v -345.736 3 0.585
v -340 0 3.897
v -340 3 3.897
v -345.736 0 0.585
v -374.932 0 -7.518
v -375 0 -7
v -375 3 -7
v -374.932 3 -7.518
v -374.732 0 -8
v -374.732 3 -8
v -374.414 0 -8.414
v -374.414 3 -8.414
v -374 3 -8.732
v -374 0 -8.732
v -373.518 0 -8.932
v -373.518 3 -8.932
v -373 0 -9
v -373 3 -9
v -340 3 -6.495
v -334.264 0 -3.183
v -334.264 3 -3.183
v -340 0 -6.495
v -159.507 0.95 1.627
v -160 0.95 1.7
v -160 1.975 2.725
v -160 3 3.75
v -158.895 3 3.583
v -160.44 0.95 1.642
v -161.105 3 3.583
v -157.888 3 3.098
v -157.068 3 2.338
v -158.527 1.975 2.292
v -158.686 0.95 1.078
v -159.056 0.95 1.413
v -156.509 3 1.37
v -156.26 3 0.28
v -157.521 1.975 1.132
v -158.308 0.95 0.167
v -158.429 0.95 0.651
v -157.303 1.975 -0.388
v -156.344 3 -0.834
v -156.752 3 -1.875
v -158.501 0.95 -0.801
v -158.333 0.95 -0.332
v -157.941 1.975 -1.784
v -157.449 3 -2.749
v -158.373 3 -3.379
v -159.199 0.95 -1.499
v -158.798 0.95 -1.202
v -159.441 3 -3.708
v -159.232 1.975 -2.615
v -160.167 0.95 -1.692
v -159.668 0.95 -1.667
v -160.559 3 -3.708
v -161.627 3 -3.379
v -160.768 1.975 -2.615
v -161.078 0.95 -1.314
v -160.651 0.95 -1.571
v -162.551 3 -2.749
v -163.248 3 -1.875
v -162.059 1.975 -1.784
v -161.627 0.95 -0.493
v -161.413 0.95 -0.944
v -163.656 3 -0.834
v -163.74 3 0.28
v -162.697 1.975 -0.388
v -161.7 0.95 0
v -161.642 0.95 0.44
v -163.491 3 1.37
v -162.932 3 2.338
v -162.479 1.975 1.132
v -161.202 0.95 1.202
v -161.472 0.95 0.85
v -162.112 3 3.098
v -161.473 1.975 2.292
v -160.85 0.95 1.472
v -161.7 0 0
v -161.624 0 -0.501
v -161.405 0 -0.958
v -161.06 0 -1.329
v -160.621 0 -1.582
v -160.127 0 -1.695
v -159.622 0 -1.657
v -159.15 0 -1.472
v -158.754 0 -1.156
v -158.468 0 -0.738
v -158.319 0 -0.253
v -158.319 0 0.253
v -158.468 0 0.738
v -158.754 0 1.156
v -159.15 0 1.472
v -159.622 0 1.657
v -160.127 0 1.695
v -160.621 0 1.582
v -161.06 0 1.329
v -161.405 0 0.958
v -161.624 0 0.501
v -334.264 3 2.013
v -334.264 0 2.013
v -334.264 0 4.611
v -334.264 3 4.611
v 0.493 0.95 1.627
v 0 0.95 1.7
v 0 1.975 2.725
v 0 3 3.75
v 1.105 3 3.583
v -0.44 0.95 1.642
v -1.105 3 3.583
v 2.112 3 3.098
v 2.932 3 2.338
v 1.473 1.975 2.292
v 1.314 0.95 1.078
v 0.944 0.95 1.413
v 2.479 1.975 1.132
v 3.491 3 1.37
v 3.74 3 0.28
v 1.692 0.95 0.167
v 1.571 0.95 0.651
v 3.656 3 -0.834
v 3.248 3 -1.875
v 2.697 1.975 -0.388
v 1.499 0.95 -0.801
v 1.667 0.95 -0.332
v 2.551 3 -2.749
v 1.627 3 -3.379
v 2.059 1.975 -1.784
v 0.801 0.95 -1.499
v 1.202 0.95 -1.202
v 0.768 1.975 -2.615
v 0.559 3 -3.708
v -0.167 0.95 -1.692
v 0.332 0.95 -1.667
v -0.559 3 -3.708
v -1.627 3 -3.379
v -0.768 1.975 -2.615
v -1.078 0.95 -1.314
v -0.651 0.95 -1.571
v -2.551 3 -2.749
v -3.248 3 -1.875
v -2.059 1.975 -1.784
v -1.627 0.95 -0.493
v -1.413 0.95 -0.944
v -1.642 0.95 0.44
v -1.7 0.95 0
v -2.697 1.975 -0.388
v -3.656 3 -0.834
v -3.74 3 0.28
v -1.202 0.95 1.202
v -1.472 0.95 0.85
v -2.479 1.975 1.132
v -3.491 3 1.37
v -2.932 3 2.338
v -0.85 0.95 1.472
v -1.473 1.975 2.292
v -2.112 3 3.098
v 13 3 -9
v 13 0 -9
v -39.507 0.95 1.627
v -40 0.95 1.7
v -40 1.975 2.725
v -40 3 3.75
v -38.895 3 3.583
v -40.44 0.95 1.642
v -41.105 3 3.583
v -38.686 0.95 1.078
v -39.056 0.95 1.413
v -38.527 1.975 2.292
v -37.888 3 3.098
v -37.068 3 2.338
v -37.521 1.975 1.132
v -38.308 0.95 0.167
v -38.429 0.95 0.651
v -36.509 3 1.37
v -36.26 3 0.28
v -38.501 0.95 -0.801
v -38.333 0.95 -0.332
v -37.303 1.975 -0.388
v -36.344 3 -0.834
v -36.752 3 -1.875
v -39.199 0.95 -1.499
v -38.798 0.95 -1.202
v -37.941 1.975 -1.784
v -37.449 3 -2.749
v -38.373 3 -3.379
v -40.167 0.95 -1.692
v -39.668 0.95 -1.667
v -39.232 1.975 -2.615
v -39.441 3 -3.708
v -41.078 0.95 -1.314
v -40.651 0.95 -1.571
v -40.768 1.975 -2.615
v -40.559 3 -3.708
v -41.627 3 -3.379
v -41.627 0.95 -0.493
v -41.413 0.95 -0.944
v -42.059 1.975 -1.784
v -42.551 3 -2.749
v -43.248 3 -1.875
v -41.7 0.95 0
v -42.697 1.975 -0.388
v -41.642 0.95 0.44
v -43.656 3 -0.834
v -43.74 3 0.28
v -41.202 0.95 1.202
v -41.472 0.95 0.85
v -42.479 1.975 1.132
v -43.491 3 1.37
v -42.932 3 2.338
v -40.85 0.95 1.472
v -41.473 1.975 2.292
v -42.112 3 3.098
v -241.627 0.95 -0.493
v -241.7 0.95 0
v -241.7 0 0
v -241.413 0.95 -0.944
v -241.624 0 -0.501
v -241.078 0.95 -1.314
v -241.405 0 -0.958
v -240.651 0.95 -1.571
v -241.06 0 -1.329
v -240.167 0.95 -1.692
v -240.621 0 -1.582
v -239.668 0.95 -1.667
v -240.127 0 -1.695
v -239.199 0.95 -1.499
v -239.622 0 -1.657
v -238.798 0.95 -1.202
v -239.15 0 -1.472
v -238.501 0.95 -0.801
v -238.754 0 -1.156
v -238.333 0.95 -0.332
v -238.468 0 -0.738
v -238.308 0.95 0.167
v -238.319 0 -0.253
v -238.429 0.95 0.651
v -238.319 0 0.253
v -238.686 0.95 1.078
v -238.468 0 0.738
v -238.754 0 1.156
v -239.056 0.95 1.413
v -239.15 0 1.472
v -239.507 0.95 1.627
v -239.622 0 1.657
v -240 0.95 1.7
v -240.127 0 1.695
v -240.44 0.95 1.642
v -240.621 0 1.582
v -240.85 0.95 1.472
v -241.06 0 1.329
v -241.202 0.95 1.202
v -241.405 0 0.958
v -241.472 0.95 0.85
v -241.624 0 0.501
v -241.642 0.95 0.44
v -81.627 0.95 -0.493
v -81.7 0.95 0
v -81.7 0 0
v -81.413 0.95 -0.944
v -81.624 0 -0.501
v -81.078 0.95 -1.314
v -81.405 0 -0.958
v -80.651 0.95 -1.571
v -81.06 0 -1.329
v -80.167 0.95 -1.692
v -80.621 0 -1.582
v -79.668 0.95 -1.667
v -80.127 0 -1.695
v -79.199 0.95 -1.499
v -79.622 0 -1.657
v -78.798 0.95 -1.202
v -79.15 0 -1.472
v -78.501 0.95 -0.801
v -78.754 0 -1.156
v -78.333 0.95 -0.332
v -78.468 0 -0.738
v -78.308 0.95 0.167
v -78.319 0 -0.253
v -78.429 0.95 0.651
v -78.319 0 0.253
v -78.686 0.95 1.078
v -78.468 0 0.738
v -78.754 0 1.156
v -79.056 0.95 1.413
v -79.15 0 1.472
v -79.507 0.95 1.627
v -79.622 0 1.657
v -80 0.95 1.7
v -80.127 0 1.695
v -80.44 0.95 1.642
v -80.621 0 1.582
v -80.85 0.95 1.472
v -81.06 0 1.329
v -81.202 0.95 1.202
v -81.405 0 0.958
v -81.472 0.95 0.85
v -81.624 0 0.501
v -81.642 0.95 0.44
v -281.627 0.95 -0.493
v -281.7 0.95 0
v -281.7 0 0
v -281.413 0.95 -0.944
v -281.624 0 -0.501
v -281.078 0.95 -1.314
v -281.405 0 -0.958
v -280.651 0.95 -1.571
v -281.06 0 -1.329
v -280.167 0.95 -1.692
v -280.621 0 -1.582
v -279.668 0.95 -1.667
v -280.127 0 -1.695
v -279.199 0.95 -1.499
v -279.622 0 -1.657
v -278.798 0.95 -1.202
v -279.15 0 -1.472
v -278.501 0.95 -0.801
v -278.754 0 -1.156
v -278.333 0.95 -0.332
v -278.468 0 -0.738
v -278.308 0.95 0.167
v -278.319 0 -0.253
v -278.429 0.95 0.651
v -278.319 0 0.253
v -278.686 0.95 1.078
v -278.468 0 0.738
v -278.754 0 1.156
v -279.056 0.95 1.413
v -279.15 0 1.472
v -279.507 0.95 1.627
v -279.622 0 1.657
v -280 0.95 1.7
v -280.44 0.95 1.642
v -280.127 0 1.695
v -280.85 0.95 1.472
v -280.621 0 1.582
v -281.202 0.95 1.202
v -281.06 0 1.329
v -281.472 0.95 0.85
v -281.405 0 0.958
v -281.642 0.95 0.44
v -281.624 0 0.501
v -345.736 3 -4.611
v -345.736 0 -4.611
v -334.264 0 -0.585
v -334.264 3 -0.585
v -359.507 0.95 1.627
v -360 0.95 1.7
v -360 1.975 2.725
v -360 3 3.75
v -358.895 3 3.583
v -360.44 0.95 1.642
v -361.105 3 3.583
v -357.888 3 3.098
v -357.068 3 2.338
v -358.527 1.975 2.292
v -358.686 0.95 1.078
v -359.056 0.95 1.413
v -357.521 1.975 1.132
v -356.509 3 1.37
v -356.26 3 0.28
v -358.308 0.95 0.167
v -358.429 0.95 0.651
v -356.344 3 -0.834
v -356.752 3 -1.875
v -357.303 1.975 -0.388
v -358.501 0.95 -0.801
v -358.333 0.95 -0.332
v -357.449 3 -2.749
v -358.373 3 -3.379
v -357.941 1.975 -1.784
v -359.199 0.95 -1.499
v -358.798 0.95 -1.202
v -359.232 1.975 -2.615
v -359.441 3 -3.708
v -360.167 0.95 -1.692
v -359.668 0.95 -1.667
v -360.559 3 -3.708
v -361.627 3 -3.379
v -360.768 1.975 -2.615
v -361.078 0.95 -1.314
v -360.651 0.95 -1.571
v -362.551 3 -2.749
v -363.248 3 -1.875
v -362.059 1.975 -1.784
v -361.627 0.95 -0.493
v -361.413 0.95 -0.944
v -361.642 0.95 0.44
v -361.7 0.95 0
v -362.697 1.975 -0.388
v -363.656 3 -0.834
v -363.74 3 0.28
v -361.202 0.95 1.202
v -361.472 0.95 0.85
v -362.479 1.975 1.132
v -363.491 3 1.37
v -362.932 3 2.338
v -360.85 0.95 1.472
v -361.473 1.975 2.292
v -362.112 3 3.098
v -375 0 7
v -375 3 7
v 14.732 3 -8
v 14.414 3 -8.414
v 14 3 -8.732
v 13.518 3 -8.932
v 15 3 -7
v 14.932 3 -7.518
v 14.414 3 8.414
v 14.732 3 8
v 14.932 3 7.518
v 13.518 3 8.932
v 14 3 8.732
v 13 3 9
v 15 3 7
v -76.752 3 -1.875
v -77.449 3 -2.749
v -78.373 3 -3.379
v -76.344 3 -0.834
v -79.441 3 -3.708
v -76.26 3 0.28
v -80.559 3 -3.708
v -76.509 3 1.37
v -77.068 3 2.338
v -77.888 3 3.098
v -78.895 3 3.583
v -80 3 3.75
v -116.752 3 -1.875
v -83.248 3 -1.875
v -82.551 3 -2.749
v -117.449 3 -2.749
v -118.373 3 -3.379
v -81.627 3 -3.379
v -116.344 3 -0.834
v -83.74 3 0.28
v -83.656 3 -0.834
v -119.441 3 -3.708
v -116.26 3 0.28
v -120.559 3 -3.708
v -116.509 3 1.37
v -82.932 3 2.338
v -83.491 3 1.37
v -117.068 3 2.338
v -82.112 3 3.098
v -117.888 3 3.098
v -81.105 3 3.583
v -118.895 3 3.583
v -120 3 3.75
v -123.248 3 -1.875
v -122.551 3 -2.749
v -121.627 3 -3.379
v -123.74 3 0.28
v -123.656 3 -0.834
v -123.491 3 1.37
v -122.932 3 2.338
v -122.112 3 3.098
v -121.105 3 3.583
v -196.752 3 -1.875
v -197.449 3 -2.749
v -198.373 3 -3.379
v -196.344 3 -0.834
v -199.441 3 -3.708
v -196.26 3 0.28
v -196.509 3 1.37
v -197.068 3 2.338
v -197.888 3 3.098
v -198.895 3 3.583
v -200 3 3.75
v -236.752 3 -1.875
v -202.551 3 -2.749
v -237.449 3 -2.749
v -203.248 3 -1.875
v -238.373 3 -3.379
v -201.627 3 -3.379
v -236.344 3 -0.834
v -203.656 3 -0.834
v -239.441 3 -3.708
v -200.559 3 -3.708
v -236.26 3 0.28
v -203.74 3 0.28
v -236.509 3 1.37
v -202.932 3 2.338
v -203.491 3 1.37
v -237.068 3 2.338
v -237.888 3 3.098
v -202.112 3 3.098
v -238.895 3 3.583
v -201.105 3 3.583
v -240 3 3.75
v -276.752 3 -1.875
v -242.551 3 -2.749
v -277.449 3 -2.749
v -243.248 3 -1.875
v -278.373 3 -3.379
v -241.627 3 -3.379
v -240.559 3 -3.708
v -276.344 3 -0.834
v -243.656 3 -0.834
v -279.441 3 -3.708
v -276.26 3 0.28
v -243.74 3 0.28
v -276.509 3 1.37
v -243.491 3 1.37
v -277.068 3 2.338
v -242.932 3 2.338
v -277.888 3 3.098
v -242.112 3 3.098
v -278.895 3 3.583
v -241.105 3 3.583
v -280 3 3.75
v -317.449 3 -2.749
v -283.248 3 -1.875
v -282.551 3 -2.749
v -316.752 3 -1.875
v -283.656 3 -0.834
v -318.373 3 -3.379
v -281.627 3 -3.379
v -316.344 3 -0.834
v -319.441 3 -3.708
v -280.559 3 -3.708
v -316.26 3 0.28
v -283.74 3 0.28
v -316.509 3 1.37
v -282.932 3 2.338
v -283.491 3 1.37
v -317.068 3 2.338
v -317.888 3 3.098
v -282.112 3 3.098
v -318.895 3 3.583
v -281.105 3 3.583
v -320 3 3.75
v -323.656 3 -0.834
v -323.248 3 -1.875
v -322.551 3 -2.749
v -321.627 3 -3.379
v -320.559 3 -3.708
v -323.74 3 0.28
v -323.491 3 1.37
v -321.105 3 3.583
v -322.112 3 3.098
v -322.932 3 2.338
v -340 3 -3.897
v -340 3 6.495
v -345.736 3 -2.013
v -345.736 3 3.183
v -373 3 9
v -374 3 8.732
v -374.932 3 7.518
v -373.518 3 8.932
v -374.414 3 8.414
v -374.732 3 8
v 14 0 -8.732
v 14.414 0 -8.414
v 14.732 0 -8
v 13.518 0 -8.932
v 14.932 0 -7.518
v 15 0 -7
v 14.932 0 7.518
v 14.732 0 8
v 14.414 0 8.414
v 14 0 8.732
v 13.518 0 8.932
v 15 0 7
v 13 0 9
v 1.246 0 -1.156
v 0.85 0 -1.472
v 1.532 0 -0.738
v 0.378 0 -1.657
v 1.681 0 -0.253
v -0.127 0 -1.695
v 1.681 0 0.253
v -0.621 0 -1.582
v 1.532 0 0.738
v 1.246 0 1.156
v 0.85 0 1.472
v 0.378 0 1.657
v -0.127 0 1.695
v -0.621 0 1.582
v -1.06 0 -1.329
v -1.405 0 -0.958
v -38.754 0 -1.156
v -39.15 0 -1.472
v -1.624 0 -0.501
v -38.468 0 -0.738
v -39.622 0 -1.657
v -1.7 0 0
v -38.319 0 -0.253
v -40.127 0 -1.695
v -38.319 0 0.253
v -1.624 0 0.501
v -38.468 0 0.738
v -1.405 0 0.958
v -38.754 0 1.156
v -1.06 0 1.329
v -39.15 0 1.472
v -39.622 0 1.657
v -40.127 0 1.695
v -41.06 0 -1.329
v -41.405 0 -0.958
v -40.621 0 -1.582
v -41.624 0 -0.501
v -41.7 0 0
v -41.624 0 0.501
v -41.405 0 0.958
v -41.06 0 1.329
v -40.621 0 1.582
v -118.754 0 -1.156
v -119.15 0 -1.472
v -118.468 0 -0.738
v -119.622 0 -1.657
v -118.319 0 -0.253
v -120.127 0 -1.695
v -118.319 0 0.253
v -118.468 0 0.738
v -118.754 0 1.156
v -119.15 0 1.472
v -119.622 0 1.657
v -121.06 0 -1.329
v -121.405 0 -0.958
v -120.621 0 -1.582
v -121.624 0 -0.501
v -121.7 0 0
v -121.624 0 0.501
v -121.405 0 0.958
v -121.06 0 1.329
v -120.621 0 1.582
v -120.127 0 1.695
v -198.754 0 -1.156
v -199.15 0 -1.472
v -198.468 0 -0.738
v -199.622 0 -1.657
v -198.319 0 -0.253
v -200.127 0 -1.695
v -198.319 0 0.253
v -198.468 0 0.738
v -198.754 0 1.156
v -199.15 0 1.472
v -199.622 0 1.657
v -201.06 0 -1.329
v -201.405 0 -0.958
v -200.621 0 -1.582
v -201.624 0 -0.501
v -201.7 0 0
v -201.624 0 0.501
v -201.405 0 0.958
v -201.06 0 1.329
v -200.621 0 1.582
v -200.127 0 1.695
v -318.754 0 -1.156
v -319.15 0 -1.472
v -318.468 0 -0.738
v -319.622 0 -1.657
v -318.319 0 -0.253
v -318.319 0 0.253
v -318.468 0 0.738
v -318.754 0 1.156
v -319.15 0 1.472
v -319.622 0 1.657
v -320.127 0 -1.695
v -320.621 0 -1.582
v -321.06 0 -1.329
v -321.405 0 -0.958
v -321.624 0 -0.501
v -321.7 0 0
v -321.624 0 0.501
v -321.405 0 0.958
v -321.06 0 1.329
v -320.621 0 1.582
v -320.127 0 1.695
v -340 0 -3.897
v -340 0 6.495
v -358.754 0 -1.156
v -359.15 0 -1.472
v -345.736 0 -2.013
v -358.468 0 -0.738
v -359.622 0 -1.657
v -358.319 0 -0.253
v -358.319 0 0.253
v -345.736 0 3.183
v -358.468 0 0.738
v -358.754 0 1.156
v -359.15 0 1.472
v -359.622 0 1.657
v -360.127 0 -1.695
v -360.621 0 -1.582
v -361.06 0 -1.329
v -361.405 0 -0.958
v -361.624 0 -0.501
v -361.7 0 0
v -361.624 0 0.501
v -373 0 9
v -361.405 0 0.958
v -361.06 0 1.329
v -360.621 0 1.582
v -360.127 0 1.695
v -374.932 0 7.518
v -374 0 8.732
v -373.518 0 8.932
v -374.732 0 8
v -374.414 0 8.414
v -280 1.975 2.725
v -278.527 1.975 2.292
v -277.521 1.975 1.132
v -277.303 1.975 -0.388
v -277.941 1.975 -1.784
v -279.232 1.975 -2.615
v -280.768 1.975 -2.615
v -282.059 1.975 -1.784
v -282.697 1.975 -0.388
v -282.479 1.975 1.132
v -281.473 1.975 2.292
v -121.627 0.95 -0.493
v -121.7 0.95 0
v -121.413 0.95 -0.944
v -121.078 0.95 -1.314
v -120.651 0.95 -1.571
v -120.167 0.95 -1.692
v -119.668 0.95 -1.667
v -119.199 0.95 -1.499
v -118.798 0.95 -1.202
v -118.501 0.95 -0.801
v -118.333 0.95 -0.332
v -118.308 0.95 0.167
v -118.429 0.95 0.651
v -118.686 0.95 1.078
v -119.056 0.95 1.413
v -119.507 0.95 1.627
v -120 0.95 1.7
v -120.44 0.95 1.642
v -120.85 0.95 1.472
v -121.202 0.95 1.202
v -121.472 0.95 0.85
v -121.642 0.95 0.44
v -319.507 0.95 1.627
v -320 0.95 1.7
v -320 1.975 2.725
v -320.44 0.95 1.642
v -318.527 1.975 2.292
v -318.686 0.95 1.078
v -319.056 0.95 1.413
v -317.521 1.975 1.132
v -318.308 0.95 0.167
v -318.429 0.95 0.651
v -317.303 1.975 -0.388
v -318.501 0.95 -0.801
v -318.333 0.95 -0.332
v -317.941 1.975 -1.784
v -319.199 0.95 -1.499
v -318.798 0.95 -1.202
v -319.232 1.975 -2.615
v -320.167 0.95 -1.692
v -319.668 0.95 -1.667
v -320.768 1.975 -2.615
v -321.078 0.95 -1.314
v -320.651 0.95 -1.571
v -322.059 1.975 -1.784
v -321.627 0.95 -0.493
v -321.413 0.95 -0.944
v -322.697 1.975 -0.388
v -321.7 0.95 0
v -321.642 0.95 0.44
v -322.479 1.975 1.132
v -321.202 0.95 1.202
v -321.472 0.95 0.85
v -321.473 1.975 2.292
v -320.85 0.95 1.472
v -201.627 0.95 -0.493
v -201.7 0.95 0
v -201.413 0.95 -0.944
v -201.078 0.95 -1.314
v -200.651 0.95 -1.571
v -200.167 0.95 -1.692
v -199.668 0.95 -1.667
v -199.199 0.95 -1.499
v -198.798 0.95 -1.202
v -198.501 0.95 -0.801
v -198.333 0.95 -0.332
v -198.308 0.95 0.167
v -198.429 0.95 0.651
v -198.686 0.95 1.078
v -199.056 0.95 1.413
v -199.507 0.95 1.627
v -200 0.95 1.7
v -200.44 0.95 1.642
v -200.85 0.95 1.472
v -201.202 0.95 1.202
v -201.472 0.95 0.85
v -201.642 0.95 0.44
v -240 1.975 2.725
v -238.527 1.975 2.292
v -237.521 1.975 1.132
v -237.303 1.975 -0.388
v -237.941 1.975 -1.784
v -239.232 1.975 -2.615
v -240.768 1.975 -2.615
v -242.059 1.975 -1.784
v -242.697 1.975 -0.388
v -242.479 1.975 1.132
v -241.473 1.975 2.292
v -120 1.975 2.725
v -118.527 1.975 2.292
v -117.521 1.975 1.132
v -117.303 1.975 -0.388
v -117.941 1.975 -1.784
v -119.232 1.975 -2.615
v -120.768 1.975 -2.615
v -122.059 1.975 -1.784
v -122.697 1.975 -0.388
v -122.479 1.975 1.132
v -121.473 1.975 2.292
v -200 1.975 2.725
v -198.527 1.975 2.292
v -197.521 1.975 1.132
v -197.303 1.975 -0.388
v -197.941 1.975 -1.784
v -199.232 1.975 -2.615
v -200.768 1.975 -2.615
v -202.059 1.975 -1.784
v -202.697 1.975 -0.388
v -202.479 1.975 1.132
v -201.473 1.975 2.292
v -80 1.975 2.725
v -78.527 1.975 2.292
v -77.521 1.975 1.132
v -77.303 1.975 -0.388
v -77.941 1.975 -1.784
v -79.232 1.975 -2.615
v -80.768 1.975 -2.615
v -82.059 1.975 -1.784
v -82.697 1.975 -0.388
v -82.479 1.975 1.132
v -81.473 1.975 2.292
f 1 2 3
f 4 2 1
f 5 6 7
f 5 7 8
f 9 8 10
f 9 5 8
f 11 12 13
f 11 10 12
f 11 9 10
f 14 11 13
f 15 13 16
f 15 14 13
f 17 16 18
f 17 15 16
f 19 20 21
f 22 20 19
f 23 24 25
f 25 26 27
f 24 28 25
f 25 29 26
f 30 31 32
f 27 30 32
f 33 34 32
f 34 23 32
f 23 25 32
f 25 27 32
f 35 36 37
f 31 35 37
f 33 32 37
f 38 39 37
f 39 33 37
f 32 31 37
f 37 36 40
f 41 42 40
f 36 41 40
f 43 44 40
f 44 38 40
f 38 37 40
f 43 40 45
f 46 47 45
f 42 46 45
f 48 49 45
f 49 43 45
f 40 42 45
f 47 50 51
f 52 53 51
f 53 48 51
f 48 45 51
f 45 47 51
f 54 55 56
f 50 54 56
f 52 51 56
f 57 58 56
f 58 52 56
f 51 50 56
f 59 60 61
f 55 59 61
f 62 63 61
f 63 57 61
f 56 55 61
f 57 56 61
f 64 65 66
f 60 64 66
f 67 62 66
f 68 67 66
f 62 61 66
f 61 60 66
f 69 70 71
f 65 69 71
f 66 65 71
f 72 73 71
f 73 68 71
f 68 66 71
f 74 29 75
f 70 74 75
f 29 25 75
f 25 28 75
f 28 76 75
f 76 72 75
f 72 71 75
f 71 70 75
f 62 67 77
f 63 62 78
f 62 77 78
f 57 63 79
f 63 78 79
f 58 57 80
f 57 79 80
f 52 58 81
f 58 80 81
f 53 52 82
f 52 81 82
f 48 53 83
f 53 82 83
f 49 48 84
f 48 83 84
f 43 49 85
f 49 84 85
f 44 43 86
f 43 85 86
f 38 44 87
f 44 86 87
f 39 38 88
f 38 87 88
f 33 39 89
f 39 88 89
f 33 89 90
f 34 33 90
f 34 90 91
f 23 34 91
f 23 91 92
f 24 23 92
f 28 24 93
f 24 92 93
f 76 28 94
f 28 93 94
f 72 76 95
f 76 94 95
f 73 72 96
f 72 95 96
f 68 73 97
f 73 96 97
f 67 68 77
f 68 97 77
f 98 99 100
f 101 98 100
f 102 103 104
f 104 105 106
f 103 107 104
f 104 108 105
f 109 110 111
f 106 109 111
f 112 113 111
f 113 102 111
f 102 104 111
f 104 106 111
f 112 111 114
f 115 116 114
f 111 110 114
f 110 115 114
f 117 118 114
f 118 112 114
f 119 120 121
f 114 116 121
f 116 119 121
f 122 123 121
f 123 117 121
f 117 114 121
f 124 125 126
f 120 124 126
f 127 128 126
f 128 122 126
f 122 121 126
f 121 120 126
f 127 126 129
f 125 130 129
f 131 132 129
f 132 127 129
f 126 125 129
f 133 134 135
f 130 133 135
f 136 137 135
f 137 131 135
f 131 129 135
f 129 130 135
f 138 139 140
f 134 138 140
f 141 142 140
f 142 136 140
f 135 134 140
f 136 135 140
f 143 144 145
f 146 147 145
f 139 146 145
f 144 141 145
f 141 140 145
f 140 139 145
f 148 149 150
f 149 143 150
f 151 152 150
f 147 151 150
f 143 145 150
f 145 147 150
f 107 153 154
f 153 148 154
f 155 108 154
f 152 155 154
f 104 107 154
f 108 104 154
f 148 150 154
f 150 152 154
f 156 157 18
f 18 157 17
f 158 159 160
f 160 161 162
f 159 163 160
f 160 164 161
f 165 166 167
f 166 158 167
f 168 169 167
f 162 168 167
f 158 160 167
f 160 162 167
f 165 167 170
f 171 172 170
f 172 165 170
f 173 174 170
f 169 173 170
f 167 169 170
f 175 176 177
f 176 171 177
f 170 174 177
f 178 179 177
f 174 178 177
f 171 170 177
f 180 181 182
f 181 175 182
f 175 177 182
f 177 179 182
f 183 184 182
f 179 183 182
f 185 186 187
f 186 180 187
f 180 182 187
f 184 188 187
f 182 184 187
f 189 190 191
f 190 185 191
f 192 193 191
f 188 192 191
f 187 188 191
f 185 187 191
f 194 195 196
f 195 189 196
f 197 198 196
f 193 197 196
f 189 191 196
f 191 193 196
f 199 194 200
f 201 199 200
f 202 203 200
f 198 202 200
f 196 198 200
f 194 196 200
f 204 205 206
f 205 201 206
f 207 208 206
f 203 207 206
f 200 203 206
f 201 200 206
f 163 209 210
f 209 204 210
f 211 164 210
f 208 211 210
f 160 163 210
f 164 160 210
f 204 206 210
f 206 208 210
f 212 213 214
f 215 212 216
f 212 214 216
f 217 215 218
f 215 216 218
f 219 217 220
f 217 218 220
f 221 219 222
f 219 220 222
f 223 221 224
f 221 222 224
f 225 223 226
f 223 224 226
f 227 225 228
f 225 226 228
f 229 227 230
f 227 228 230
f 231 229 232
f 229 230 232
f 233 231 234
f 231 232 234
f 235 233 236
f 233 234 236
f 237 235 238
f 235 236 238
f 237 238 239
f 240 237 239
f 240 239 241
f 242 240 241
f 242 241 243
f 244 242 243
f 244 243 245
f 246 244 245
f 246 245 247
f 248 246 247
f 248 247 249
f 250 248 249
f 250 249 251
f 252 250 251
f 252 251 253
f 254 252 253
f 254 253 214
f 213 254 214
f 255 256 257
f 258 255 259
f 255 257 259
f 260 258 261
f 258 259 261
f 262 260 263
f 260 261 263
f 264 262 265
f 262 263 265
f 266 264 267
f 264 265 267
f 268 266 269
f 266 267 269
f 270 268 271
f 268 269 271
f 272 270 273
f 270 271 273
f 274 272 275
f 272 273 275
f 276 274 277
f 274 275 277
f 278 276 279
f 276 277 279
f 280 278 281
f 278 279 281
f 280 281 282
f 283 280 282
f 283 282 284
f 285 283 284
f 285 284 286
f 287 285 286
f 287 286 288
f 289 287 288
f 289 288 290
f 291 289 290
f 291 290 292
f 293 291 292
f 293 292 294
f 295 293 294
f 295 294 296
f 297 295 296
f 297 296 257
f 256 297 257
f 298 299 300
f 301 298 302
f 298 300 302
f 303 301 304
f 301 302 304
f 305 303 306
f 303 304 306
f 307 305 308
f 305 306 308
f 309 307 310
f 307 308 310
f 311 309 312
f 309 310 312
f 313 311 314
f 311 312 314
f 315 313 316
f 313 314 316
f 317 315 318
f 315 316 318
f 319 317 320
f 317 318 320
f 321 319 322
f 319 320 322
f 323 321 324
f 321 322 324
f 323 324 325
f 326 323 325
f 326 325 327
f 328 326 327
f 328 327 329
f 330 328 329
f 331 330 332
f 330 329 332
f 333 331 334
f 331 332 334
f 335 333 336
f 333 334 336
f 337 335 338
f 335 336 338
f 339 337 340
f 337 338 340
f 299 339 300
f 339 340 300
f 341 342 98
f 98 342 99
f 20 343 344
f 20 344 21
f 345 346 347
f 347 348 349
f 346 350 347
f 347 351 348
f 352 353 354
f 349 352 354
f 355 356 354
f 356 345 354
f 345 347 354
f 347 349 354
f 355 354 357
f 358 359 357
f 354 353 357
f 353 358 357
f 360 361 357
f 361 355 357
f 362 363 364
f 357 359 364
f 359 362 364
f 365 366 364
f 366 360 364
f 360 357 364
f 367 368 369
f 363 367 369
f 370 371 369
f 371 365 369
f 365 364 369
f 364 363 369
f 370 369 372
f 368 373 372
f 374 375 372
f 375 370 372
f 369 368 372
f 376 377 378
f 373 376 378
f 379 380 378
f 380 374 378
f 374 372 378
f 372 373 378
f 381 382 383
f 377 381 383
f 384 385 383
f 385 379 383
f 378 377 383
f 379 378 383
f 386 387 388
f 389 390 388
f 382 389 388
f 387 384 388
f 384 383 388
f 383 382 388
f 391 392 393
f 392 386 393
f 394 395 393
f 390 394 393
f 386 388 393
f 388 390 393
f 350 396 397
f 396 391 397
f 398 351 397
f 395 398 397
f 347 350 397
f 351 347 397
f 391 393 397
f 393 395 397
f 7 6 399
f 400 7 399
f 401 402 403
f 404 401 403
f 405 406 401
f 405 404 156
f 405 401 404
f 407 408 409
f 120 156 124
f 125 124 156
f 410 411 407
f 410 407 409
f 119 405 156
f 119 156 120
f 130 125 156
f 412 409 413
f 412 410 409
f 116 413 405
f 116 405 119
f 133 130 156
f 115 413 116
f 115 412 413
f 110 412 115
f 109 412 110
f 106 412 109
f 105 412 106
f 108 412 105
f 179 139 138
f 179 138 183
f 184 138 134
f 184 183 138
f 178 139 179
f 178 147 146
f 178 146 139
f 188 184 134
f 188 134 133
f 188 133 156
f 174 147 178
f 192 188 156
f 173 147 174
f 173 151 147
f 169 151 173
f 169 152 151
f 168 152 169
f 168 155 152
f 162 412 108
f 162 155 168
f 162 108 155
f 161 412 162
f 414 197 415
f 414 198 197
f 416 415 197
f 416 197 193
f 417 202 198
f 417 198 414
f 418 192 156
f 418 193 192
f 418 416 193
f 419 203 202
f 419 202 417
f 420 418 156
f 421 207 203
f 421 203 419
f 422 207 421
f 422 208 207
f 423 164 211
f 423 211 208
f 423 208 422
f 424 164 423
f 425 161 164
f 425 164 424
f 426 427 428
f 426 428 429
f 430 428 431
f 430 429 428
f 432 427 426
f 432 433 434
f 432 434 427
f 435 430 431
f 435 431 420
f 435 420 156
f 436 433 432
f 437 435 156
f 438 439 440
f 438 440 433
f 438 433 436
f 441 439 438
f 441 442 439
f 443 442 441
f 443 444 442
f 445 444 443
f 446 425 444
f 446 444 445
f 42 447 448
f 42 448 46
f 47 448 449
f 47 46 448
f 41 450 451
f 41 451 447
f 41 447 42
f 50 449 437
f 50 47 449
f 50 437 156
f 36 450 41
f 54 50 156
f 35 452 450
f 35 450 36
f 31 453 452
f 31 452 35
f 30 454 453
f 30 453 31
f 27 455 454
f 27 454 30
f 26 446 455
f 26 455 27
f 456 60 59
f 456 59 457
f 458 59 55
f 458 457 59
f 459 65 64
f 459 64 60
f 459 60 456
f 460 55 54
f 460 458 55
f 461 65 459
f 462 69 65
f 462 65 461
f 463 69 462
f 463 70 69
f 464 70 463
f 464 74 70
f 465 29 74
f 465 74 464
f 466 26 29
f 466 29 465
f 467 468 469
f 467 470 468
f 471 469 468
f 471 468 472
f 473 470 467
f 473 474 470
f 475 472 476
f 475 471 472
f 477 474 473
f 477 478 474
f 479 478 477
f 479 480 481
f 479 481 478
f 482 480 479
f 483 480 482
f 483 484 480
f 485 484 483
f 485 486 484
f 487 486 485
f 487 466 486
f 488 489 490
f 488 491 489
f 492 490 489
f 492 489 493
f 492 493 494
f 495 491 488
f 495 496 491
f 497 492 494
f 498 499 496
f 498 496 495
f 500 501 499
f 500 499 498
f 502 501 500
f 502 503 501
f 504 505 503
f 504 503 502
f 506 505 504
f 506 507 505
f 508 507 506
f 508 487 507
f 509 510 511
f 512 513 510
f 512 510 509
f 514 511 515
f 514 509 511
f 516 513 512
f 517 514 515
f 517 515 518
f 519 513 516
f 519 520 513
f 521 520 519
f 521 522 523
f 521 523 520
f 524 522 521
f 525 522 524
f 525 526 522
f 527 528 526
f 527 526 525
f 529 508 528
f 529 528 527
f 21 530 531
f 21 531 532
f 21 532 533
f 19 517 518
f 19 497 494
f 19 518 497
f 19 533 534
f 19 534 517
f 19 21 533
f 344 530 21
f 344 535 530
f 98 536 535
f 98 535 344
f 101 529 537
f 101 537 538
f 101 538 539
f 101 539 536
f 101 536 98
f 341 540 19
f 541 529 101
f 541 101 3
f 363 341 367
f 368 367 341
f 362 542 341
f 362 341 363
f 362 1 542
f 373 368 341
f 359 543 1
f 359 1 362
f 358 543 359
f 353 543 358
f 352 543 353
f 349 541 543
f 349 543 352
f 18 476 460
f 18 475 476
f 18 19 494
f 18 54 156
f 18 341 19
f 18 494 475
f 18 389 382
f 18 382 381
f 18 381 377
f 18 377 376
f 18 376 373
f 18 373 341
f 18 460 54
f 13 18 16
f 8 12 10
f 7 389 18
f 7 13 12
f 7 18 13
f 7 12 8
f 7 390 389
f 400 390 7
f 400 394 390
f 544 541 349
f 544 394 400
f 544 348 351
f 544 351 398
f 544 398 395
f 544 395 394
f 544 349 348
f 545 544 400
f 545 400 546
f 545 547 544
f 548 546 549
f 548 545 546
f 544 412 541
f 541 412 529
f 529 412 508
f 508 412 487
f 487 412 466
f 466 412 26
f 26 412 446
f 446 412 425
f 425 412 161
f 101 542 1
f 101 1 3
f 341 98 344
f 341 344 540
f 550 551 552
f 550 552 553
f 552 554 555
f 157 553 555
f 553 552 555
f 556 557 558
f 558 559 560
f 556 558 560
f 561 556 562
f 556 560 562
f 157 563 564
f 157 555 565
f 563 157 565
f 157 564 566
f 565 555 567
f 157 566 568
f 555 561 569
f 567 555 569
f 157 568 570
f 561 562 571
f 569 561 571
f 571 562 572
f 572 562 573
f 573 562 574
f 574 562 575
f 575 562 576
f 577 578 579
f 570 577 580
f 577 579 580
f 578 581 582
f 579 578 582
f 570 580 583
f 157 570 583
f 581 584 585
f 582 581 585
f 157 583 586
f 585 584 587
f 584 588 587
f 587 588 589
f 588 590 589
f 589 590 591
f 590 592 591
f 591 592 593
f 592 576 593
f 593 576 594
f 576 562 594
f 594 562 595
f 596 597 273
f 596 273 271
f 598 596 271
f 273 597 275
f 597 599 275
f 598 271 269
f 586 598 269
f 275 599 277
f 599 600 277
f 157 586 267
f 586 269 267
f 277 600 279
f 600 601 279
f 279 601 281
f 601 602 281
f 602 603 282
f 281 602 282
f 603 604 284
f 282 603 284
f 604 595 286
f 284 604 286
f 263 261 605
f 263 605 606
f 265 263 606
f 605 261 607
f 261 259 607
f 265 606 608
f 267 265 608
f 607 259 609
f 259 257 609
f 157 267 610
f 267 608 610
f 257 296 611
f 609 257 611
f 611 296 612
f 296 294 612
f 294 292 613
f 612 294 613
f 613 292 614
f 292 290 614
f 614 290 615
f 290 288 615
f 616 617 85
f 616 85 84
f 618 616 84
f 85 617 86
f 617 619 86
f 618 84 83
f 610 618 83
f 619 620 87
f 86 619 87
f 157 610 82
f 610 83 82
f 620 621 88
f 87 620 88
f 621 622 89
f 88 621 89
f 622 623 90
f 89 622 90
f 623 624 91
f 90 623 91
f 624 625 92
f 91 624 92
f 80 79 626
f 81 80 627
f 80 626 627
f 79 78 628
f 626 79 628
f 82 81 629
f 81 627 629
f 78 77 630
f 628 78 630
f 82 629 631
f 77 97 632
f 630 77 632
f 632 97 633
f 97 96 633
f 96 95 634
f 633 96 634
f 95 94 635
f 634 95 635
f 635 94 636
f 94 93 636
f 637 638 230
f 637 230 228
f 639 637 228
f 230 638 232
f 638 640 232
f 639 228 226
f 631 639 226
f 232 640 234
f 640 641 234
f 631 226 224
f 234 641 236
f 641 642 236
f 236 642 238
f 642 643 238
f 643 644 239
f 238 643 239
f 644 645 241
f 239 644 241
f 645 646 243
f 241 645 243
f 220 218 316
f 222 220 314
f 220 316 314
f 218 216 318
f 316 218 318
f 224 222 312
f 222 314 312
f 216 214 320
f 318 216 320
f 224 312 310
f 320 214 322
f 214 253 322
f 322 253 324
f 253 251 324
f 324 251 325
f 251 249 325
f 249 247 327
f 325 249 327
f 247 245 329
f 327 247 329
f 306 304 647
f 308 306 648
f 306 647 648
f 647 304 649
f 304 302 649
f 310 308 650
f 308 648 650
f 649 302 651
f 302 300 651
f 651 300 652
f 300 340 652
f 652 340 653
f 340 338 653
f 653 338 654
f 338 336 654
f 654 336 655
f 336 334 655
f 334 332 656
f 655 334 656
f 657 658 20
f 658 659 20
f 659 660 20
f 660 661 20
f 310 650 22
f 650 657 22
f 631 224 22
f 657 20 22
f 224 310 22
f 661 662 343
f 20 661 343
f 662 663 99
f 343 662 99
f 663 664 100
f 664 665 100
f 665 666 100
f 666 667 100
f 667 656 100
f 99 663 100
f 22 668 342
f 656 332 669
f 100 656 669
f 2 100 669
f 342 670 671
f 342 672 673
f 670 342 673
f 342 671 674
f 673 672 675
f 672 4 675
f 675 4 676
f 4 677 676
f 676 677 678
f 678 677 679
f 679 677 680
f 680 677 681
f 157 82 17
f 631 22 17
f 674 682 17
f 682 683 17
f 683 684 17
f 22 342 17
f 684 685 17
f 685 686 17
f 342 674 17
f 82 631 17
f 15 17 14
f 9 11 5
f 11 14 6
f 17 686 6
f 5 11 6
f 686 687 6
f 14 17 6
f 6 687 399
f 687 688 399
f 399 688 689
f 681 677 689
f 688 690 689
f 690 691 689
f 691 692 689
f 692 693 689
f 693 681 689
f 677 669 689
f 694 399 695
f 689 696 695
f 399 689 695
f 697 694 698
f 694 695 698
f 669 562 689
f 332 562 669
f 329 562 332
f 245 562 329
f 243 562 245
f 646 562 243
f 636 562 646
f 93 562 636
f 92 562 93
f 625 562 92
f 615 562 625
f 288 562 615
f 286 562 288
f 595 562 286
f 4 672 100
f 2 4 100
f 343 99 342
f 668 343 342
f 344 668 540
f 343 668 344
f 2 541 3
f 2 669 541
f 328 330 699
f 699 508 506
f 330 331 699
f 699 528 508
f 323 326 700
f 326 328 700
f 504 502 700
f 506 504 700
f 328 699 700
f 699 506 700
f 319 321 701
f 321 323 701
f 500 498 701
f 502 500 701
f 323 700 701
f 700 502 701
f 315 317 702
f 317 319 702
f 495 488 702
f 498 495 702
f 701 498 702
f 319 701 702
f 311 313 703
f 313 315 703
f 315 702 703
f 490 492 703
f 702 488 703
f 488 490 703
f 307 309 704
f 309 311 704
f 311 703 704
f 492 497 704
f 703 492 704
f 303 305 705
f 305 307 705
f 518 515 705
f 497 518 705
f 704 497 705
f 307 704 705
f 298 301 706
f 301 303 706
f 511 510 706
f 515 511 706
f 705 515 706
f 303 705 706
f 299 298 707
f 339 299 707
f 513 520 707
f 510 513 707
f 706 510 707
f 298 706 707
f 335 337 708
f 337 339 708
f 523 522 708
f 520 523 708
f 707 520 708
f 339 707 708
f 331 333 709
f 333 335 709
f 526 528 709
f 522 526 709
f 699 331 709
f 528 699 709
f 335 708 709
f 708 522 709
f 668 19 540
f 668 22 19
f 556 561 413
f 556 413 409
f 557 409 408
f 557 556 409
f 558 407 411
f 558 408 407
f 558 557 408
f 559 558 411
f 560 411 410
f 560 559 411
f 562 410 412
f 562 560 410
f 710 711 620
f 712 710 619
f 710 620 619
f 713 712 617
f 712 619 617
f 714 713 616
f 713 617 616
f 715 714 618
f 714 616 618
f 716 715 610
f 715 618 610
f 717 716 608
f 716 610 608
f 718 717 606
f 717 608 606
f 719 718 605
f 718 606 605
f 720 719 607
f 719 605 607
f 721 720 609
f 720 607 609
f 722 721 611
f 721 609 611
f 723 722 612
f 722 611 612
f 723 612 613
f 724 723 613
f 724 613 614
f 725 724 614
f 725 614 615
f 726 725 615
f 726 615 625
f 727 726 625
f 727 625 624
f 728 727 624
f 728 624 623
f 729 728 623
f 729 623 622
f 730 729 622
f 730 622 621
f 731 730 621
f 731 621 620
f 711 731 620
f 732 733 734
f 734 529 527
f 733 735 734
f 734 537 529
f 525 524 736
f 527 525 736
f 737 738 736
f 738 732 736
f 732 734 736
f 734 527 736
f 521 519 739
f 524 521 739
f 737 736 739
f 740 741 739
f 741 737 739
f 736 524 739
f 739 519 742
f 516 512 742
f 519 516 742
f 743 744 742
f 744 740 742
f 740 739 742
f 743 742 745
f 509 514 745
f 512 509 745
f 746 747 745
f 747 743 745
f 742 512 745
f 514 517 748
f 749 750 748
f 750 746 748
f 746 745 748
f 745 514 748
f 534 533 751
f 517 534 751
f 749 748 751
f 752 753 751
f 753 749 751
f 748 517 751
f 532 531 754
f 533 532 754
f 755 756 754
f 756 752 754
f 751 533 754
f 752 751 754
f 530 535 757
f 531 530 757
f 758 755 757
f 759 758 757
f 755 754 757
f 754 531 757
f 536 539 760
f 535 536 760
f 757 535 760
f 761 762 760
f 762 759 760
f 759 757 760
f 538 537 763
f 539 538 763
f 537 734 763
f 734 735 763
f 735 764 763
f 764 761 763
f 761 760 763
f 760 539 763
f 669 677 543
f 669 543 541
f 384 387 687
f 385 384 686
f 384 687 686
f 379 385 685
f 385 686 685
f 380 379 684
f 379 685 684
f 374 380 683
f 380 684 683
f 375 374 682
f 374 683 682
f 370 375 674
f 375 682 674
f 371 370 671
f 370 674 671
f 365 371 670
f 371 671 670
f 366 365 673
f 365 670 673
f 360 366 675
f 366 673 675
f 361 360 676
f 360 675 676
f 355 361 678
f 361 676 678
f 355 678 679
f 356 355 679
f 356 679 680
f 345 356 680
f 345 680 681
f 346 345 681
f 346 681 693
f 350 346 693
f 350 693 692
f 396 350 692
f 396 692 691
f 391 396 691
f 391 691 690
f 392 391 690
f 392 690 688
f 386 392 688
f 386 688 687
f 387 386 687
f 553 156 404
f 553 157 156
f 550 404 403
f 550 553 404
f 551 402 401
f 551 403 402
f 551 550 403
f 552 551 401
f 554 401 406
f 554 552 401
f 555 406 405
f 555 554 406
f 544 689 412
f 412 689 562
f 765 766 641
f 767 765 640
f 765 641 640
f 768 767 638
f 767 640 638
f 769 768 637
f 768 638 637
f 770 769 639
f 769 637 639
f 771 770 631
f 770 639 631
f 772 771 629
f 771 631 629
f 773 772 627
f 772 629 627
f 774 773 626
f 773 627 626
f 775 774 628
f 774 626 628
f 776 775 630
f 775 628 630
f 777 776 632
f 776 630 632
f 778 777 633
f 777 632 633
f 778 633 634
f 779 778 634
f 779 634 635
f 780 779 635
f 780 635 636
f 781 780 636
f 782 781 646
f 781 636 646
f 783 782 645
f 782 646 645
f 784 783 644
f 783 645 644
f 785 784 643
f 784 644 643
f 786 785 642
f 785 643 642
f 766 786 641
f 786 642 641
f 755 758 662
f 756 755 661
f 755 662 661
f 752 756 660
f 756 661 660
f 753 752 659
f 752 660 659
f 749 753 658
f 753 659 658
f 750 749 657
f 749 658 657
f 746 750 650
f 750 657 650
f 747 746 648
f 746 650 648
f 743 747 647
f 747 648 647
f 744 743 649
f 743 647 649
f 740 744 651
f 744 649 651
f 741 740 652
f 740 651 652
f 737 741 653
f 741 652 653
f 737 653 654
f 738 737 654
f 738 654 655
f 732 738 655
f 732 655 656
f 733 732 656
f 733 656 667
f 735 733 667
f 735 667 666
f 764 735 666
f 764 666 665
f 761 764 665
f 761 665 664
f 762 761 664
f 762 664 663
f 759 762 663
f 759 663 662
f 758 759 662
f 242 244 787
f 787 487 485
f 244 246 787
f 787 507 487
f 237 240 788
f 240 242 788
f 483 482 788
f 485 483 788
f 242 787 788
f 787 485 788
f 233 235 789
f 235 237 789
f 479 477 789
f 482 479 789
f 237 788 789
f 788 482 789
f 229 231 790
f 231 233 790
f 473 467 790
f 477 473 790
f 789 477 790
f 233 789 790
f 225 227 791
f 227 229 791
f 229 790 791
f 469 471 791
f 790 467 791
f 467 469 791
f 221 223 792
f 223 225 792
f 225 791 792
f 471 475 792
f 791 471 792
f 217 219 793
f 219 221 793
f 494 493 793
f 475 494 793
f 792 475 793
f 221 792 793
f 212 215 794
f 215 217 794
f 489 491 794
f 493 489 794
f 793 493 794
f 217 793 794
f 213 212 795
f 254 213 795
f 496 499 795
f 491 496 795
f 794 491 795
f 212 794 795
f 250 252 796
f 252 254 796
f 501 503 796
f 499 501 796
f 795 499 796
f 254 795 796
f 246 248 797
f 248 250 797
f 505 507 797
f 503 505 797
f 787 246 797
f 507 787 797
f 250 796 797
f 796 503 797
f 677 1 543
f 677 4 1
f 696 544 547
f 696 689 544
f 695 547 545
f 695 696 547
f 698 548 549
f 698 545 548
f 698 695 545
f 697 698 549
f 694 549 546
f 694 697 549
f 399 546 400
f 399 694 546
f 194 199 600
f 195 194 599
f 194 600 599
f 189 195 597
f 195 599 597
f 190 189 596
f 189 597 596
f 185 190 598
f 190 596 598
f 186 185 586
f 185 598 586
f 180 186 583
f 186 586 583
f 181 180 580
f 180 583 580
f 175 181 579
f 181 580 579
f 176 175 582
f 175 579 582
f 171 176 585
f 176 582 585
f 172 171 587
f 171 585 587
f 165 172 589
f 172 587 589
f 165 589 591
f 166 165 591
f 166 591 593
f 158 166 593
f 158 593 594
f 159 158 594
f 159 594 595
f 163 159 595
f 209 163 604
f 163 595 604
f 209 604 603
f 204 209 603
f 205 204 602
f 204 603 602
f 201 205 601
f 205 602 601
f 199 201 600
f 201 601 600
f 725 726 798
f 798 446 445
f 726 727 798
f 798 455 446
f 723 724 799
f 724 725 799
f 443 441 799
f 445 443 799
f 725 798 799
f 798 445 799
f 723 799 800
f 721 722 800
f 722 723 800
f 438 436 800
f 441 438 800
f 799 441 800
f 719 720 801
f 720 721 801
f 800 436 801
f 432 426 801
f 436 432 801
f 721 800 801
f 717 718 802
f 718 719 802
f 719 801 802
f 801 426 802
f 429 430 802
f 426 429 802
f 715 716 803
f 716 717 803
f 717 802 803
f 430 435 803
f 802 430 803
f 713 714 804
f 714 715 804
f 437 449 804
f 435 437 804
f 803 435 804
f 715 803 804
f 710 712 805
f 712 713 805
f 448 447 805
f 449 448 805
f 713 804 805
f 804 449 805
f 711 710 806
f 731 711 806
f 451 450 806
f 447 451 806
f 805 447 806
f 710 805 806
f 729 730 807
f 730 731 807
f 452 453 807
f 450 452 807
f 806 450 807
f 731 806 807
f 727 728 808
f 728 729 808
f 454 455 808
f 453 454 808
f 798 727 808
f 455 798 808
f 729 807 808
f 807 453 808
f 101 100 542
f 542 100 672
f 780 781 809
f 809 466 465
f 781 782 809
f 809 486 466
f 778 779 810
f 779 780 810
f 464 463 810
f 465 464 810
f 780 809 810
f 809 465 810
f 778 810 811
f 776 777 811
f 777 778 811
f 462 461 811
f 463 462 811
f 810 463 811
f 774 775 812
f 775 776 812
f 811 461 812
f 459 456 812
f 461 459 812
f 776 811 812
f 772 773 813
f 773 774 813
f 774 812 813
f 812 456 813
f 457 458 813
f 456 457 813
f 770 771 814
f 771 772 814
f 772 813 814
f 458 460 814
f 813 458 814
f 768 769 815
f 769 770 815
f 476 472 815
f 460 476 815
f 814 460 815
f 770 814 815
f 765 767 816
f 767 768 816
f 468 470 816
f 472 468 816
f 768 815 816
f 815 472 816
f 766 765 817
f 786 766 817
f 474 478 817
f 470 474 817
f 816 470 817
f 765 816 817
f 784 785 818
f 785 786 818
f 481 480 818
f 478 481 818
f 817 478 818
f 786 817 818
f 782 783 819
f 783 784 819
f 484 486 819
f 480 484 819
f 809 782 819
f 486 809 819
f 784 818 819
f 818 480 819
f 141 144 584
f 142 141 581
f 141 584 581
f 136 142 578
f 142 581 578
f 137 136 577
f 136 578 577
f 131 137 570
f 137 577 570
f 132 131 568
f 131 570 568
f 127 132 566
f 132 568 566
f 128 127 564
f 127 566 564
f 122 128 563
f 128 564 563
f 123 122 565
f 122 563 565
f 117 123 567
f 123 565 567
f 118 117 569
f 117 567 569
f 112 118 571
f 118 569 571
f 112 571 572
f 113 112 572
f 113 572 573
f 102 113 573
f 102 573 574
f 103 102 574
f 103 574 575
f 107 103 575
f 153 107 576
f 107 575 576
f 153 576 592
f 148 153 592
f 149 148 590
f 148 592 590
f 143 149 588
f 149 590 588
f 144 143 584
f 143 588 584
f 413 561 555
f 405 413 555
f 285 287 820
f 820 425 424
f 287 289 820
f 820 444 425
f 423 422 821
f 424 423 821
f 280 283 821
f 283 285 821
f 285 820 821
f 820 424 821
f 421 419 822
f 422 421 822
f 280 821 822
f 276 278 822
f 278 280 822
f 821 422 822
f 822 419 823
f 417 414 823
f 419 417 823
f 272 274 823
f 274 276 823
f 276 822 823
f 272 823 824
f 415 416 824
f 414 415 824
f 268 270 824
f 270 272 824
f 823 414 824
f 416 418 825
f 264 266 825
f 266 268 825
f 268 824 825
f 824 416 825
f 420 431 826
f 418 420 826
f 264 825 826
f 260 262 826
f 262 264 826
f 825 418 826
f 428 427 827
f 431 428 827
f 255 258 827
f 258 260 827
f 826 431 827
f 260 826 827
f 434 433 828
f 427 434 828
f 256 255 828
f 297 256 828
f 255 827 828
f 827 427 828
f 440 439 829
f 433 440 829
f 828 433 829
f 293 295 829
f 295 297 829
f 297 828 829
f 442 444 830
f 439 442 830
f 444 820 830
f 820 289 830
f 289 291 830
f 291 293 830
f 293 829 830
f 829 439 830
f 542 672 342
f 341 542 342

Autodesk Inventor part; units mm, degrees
ref_plane "YZ Plane" through (0, 0, 0) normal (1, 0, 0) x (0, 1, 0)
ref_plane "XZ Plane" through (0, 0, 0) normal (0, 1, 0) x (-1, 0, 0)
ref_plane "XY Plane" through (0, 0, 0) normal (0, 0, 1) x (1, 0, 0)
sketch "ExtrusionBacker_Y_350mm_B" plane through (0, 0, 0) normal (0, 0, 1) x (1, 0, 0)
  arc A0 (355.9999, 24.106) -> (357.9999, 26.106) centre (355.9999, 26.106) ccw
  line L0 (357.9999, 26.106) -> (357.9999, 40.106)
  arc A1 (357.9999, 40.106) -> (355.9999, 42.106) centre (355.9999, 40.106) ccw
  line L1 (355.9999, 42.106) -> (-30.0001, 42.106)
  arc A2 (-30.0001, 42.106) -> (-32.0001, 40.106) centre (-30.0001, 40.106) ccw
  line L2 (-32.0001, 40.106) -> (-32.0001, 26.106)
  arc A3 (-32.0001, 26.106) -> (-30.0001, 24.106) centre (-30.0001, 26.106) ccw
  line L3 (-30.0001, 24.106) -> (355.9999, 24.106)
  line L4 (322.9999, 37.0031) -> (328.736, 33.6914)
  line L5 (328.736, 33.6914) -> (328.736, 36.2894)
  line L6 (328.736, 36.2894) -> (322.9999, 39.6012)
  line L7 (322.9999, 39.6012) -> (322.9999, 37.0031)
  line L8 (317.2637, 35.1187) -> (317.2637, 37.7168)
  line L9 (317.2637, 37.7168) -> (328.736, 31.0933)
  line L10 (328.736, 31.0933) -> (328.736, 28.4952)
  line L11 (328.736, 28.4952) -> (317.2637, 35.1187)
  line L12 (317.2637, 32.5207) -> (317.2637, 29.9226)
  line L13 (317.2637, 29.9226) -> (322.9999, 26.6108)
  line L14 (322.9999, 26.6108) -> (322.9999, 29.2089)
  line L15 (322.9999, 29.2089) -> (317.2637, 32.5207)
  circle A4 centre (102.9999, 33.106) radius 1.7
  circle A5 centre (142.9999, 33.106) radius 1.7
  circle A6 centre (222.9999, 33.106) radius 1.7
  circle A7 centre (182.9999, 33.106) radius 1.7
  circle A8 centre (62.9999, 33.106) radius 1.7
  circle A9 centre (302.9999, 33.106) radius 1.7
  circle A10 centre (342.9999, 33.106) radius 1.7
  circle A11 centre (-17.0001, 33.106) radius 1.7
  circle A12 centre (22.9999, 33.106) radius 1.7
  circle A13 centre (262.9999, 33.106) radius 1.7
sketch "Skizze1" plane through (0, 0, 0) normal (0, 1, 0) x (-1, 0, 0)
  arc A0 (373, -9) -> (375, -7) centre (373, -7) ccw
  line L0 (375, -7) -> (375, 7)
  arc A1 (375, 7) -> (373, 9) centre (373, 7) ccw
  line L1 (373, 9) -> (-13, 9)
  arc A2 (-13, 9) -> (-15, 7) centre (-13, 7) ccw
  line L2 (-15, 7) -> (-15, -7)
  arc A3 (-15, -7) -> (-13, -9) centre (-13, -7) ccw
  line L3 (-13, -9) -> (373, -9)
  line L4 (340, 3.8971) -> (345.7362, 0.5853)
  line L5 (345.7362, 0.5853) -> (345.7362, 3.1834)
  line L6 (345.7362, 3.1834) -> (340, 6.4952)
  line L7 (340, 6.4952) -> (340, 3.8971)
  line L8 (334.2638, 2.0127) -> (334.2638, 4.6108)
  line L9 (334.2638, 4.6108) -> (345.7362, -2.0127)
  line L10 (345.7362, -2.0127) -> (345.7362, -4.6108)
  line L11 (345.7362, -4.6108) -> (334.2638, 2.0127)
  line L12 (334.2638, -0.5853) -> (334.2638, -3.1834)
  line L13 (334.2638, -3.1834) -> (340, -6.4952)
  line L14 (340, -6.4952) -> (340, -3.8971)
  line L15 (340, -3.8971) -> (334.2638, -0.5853)
  circle A4 centre (120, 0) radius 1.7
  circle A5 centre (160, 0) radius 1.7
  circle A6 centre (240, 0) radius 1.7
  circle A7 centre (200, 0) radius 1.7
  circle A8 centre (80, 0) radius 1.7
  circle A9 centre (320, 0) radius 1.7
  circle A10 centre (360, 0) radius 1.7
  circle A11 centre (0, 0) radius 1.7
  circle A12 centre (40, 0) radius 1.7
  circle A13 centre (280, 0) radius 1.7
  point P0 (373, -9)
  point P1 (375, 7)
  point P2 (373, 9)
  point P3 (-13, 9)
  point P4 (-15, 7)
  point P5 (-15, -7)
  point P6 (-13, -9)
  point P7 (334.2638, -0.5853)
  point P8 (340, -3.8971)
  point P9 (340, -6.4952)
  point P10 (334.2638, -3.1834)
  point P11 (334.2638, 2.0127)
  point P12 (334.2638, 4.6108)
  point P13 (345.7362, -2.0127)
  point P14 (345.7362, -4.6108)
  point P15 (340, 3.8971)
  point P16 (340, 6.4952)
  point P17 (345.7362, 0.5853)
extrude "Extrusion1" add sketch "Skizze1" along normal blind 3
sketch "Skizze2" plane through (0, 3, 0) normal (0, 1, 0) x (1, 0, 0)
  circle A0 centre (-360, 0) radius 1.7 projected
  circle A1 centre (-320, 0) radius 1.7 projected
  circle A2 centre (-280, 0) radius 1.7 projected
  circle A3 centre (-240, 0) radius 1.7 projected
  circle A4 centre (-200, 0) radius 1.7 projected
  circle A5 centre (-160, 0) radius 1.7 projected
  circle A6 centre (-120, 0) radius 1.7 projected
  circle A7 centre (-80, 0) radius 1.7 projected
  circle A8 centre (-40, 0) radius 1.7 projected
  circle A9 centre (0, 0) radius 1.7 projected
hole "Bohrung1" at (-360, 3, 0) at (-320, 3, 0) at (-280, 3, 0) at (-240, 3, 0) at (-200, 3, 0) at (-160, 3, 0) at (-120, 3, 0) at (-80, 3, 0) at (-40, 3, 0) at (0, 3, 0) direction (0, -1, 0) diameter 3.4 end through all countersink diameter 7.5 countersink angle 90 clearance for "Innensechskant-Senkkopfschraube DIN EN ISO 10642" size "M3" standard "DIN"
properties part number "Y Extrusion-Backer [B] (350mm)" material "Titan"
